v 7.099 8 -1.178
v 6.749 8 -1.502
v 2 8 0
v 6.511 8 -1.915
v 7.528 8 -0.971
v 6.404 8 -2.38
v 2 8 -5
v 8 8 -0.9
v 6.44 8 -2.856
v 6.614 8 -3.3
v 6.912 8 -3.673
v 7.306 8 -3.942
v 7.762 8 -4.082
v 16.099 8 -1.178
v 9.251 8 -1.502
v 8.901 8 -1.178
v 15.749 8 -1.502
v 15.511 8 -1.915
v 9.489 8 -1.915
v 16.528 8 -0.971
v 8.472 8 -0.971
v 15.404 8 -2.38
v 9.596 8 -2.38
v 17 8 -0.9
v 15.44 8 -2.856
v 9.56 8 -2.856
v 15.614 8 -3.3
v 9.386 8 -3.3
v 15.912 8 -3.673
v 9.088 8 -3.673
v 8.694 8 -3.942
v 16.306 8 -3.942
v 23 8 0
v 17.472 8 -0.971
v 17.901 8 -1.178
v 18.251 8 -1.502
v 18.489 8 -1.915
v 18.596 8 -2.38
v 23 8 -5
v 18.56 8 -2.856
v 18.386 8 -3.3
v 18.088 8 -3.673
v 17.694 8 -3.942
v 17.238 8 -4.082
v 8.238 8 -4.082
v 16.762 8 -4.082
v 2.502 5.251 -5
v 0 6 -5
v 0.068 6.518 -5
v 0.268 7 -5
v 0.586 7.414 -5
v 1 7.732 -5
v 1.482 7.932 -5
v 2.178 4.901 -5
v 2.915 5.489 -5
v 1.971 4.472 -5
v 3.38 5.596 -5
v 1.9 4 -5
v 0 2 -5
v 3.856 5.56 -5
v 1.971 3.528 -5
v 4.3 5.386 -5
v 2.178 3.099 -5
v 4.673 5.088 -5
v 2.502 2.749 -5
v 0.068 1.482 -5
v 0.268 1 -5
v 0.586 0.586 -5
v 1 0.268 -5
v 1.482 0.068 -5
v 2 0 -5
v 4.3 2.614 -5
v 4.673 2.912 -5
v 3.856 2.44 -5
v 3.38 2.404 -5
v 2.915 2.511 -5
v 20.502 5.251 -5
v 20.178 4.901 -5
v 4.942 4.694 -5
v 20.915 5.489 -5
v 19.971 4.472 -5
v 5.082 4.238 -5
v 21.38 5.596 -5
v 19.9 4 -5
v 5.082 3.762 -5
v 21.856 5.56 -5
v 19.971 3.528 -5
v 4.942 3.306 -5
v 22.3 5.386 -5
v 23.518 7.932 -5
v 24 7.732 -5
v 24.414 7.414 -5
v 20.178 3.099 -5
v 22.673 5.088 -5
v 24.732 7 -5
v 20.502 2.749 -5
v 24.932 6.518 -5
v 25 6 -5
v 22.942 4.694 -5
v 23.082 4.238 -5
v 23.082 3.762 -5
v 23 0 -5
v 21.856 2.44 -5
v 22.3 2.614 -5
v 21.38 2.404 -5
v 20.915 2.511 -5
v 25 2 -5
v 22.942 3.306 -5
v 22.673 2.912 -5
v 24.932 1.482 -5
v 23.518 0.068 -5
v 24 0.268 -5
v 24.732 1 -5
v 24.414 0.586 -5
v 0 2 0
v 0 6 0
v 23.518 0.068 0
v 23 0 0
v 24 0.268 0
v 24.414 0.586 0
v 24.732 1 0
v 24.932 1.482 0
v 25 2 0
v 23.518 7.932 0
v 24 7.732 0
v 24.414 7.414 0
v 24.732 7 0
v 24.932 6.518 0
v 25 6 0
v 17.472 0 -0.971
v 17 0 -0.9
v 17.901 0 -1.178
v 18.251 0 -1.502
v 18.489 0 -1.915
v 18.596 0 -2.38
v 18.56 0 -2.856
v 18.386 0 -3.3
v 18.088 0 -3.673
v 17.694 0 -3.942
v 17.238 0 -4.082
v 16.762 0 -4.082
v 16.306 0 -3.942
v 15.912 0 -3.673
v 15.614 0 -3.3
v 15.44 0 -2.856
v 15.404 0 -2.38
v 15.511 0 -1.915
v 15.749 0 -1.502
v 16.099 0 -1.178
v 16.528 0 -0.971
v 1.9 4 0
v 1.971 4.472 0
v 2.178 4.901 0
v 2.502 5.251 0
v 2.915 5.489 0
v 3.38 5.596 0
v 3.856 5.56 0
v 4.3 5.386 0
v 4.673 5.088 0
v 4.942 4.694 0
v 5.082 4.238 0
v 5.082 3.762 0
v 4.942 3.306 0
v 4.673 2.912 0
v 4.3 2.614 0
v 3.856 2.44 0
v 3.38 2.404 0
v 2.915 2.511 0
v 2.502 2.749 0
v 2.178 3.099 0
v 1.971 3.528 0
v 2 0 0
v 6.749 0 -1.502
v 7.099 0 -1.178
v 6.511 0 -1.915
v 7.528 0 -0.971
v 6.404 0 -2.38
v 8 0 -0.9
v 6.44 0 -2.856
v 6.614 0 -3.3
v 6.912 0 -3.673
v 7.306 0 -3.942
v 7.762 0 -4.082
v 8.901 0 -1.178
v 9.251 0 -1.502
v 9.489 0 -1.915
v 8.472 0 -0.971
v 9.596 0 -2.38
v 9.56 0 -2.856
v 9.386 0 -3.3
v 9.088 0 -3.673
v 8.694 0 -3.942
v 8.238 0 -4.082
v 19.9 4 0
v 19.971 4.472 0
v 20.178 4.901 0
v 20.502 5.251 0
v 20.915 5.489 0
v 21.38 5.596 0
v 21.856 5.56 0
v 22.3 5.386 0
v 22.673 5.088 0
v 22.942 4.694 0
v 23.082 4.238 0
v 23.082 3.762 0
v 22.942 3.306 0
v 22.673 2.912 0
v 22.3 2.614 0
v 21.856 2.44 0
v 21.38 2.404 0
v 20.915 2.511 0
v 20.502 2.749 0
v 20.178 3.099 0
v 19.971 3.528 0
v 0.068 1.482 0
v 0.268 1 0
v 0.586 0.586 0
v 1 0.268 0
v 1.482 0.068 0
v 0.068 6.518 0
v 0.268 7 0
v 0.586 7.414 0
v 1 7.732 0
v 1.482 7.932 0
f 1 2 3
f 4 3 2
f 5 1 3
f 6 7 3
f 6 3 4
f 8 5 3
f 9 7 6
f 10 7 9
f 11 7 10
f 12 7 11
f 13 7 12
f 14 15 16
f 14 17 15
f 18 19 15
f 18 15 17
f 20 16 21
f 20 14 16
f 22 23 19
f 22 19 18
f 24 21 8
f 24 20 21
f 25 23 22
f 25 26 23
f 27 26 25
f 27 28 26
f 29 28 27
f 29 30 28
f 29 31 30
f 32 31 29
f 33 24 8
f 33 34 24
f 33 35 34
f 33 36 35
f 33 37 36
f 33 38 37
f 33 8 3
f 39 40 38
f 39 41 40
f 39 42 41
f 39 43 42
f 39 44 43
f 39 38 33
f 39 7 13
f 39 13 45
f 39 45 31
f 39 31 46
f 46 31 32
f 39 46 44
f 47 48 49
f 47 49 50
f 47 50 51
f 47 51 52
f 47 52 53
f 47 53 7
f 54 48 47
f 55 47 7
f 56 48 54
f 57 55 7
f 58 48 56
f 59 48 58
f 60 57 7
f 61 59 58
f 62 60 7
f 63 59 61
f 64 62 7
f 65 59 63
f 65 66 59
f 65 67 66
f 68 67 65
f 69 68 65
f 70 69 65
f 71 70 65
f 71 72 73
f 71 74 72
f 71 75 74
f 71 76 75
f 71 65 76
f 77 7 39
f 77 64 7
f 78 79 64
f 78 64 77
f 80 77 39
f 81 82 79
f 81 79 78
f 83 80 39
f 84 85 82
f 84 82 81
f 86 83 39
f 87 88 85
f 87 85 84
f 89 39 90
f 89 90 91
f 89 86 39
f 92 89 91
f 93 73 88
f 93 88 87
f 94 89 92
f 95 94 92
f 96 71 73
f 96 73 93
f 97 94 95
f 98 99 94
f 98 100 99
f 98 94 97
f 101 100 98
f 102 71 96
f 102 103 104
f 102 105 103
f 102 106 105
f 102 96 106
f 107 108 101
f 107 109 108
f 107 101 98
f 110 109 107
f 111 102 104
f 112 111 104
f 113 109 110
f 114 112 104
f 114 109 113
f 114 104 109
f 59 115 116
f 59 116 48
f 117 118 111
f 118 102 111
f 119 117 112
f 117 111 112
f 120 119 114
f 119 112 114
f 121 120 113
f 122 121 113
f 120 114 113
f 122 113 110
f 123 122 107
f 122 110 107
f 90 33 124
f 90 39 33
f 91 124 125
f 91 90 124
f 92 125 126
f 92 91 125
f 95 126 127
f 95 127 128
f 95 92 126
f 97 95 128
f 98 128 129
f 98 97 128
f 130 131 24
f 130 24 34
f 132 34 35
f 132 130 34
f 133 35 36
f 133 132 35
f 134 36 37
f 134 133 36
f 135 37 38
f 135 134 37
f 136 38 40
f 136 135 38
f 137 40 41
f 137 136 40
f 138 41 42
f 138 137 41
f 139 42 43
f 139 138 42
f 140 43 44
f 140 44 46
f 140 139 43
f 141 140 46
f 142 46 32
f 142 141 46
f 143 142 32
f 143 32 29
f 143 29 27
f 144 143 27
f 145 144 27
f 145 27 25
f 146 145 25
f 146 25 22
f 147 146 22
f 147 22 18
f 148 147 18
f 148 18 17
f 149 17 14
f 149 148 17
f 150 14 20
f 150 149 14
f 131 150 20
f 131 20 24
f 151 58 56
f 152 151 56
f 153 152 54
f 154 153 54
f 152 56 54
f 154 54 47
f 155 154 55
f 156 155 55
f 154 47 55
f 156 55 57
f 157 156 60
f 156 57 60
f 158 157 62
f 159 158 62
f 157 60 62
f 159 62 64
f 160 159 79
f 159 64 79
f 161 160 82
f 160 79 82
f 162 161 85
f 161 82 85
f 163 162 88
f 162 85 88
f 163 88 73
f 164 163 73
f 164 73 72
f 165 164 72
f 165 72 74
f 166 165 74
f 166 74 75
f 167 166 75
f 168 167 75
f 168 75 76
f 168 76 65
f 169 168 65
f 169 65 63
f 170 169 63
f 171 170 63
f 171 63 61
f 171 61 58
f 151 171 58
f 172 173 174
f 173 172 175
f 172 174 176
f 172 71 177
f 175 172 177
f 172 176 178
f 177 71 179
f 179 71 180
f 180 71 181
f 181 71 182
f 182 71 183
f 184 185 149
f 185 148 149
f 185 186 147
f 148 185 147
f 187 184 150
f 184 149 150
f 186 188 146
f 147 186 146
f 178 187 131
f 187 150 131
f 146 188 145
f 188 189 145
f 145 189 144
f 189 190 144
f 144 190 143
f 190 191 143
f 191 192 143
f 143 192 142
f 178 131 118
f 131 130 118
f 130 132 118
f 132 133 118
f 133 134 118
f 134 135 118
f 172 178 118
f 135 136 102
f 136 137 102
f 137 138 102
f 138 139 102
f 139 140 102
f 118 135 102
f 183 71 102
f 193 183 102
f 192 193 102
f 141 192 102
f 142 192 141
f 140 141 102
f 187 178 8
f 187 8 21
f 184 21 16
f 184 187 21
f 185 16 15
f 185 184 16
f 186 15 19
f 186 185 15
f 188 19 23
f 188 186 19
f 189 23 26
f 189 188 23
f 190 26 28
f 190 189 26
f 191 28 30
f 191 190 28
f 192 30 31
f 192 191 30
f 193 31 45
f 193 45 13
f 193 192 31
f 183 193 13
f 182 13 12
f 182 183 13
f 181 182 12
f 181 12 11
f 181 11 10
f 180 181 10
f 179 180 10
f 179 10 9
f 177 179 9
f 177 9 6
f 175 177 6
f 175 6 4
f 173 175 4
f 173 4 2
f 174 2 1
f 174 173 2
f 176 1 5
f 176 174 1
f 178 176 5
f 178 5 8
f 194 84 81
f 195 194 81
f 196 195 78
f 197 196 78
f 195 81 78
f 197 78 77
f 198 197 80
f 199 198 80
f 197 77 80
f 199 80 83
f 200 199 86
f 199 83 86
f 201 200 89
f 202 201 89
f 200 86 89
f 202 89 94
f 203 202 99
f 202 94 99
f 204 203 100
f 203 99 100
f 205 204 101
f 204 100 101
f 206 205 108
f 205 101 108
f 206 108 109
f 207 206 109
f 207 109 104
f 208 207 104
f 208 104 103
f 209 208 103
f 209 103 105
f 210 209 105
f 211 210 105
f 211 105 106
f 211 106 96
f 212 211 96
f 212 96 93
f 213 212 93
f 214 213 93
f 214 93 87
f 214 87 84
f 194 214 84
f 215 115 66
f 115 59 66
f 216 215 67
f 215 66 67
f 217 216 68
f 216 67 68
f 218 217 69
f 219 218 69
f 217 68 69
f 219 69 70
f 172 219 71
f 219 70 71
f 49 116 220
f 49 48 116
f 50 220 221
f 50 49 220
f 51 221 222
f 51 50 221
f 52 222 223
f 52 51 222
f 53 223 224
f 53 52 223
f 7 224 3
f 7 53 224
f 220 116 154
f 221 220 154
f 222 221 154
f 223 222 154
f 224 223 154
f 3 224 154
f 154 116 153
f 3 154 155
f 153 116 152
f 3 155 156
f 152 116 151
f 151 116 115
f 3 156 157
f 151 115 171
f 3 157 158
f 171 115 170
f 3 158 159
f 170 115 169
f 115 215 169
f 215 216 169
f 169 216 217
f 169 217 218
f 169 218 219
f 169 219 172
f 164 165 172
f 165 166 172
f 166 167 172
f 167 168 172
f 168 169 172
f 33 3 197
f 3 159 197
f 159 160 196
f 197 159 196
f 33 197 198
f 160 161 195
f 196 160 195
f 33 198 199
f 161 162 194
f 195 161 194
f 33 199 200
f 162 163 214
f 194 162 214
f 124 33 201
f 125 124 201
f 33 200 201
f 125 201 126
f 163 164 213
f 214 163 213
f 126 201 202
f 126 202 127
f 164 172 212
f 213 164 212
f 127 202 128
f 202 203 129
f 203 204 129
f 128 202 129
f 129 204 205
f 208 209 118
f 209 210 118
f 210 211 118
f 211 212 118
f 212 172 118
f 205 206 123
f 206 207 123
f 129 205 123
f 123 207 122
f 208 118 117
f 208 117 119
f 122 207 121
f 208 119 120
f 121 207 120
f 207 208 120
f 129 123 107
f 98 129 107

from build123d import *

# Parameters (mm, degrees)
SKETCH1_W           = 25
SKETCH1_H           = 5
SKETCH1_R           = 1.6
BOSS_EXTRUDE1_DEPTH = 8
SKETCH2_R           = 1.6
CUT_EXTRUDE1_DEPTH  = 8
FILLET1_R           = 2


with BuildPart() as part:
    # Sketch1 → Boss-Extrude1 (new body)
    with BuildSketch(Plane(origin=(0, 0, 0), x_dir=(1, 0, 0), z_dir=(0, 1, 0))):
        with Locations((12.5, 2.5)):
            Rectangle(SKETCH1_W, SKETCH1_H)
        with Locations(Location((8, 2.5, 0), (0, 0, 270))):
            Circle(SKETCH1_R, mode=Mode.SUBTRACT)
        with Locations(Location((17, 2.5, 0), (0, 0, 270))):
            Circle(SKETCH1_R, mode=Mode.SUBTRACT)
    extrude(amount=BOSS_EXTRUDE1_DEPTH)

    # Sketch2 → Cut-Extrude1 (cut)
    with BuildSketch(Plane(origin=(0, 0, -5), x_dir=(-1, 0, 0), z_dir=(0, 0, -1))):
        with Locations((-21.5, 4)):
            Circle(SKETCH2_R)
        with Locations((-3.5, 4)):
            Circle(SKETCH2_R)
    extrude(amount=-CUT_EXTRUDE1_DEPTH, mode=Mode.SUBTRACT)

    # Fillet1
    fillet1_edges = [part.edges().sort_by_distance(p)[0] for p in [
        (25, 8, -2.5),
        (0, 8, -2.5),
        (25, 0, -2.5),
        (0, 0, -2.5),
    ]]
    fillet(fillet1_edges, radius=FILLET1_R)


solid = part.part
